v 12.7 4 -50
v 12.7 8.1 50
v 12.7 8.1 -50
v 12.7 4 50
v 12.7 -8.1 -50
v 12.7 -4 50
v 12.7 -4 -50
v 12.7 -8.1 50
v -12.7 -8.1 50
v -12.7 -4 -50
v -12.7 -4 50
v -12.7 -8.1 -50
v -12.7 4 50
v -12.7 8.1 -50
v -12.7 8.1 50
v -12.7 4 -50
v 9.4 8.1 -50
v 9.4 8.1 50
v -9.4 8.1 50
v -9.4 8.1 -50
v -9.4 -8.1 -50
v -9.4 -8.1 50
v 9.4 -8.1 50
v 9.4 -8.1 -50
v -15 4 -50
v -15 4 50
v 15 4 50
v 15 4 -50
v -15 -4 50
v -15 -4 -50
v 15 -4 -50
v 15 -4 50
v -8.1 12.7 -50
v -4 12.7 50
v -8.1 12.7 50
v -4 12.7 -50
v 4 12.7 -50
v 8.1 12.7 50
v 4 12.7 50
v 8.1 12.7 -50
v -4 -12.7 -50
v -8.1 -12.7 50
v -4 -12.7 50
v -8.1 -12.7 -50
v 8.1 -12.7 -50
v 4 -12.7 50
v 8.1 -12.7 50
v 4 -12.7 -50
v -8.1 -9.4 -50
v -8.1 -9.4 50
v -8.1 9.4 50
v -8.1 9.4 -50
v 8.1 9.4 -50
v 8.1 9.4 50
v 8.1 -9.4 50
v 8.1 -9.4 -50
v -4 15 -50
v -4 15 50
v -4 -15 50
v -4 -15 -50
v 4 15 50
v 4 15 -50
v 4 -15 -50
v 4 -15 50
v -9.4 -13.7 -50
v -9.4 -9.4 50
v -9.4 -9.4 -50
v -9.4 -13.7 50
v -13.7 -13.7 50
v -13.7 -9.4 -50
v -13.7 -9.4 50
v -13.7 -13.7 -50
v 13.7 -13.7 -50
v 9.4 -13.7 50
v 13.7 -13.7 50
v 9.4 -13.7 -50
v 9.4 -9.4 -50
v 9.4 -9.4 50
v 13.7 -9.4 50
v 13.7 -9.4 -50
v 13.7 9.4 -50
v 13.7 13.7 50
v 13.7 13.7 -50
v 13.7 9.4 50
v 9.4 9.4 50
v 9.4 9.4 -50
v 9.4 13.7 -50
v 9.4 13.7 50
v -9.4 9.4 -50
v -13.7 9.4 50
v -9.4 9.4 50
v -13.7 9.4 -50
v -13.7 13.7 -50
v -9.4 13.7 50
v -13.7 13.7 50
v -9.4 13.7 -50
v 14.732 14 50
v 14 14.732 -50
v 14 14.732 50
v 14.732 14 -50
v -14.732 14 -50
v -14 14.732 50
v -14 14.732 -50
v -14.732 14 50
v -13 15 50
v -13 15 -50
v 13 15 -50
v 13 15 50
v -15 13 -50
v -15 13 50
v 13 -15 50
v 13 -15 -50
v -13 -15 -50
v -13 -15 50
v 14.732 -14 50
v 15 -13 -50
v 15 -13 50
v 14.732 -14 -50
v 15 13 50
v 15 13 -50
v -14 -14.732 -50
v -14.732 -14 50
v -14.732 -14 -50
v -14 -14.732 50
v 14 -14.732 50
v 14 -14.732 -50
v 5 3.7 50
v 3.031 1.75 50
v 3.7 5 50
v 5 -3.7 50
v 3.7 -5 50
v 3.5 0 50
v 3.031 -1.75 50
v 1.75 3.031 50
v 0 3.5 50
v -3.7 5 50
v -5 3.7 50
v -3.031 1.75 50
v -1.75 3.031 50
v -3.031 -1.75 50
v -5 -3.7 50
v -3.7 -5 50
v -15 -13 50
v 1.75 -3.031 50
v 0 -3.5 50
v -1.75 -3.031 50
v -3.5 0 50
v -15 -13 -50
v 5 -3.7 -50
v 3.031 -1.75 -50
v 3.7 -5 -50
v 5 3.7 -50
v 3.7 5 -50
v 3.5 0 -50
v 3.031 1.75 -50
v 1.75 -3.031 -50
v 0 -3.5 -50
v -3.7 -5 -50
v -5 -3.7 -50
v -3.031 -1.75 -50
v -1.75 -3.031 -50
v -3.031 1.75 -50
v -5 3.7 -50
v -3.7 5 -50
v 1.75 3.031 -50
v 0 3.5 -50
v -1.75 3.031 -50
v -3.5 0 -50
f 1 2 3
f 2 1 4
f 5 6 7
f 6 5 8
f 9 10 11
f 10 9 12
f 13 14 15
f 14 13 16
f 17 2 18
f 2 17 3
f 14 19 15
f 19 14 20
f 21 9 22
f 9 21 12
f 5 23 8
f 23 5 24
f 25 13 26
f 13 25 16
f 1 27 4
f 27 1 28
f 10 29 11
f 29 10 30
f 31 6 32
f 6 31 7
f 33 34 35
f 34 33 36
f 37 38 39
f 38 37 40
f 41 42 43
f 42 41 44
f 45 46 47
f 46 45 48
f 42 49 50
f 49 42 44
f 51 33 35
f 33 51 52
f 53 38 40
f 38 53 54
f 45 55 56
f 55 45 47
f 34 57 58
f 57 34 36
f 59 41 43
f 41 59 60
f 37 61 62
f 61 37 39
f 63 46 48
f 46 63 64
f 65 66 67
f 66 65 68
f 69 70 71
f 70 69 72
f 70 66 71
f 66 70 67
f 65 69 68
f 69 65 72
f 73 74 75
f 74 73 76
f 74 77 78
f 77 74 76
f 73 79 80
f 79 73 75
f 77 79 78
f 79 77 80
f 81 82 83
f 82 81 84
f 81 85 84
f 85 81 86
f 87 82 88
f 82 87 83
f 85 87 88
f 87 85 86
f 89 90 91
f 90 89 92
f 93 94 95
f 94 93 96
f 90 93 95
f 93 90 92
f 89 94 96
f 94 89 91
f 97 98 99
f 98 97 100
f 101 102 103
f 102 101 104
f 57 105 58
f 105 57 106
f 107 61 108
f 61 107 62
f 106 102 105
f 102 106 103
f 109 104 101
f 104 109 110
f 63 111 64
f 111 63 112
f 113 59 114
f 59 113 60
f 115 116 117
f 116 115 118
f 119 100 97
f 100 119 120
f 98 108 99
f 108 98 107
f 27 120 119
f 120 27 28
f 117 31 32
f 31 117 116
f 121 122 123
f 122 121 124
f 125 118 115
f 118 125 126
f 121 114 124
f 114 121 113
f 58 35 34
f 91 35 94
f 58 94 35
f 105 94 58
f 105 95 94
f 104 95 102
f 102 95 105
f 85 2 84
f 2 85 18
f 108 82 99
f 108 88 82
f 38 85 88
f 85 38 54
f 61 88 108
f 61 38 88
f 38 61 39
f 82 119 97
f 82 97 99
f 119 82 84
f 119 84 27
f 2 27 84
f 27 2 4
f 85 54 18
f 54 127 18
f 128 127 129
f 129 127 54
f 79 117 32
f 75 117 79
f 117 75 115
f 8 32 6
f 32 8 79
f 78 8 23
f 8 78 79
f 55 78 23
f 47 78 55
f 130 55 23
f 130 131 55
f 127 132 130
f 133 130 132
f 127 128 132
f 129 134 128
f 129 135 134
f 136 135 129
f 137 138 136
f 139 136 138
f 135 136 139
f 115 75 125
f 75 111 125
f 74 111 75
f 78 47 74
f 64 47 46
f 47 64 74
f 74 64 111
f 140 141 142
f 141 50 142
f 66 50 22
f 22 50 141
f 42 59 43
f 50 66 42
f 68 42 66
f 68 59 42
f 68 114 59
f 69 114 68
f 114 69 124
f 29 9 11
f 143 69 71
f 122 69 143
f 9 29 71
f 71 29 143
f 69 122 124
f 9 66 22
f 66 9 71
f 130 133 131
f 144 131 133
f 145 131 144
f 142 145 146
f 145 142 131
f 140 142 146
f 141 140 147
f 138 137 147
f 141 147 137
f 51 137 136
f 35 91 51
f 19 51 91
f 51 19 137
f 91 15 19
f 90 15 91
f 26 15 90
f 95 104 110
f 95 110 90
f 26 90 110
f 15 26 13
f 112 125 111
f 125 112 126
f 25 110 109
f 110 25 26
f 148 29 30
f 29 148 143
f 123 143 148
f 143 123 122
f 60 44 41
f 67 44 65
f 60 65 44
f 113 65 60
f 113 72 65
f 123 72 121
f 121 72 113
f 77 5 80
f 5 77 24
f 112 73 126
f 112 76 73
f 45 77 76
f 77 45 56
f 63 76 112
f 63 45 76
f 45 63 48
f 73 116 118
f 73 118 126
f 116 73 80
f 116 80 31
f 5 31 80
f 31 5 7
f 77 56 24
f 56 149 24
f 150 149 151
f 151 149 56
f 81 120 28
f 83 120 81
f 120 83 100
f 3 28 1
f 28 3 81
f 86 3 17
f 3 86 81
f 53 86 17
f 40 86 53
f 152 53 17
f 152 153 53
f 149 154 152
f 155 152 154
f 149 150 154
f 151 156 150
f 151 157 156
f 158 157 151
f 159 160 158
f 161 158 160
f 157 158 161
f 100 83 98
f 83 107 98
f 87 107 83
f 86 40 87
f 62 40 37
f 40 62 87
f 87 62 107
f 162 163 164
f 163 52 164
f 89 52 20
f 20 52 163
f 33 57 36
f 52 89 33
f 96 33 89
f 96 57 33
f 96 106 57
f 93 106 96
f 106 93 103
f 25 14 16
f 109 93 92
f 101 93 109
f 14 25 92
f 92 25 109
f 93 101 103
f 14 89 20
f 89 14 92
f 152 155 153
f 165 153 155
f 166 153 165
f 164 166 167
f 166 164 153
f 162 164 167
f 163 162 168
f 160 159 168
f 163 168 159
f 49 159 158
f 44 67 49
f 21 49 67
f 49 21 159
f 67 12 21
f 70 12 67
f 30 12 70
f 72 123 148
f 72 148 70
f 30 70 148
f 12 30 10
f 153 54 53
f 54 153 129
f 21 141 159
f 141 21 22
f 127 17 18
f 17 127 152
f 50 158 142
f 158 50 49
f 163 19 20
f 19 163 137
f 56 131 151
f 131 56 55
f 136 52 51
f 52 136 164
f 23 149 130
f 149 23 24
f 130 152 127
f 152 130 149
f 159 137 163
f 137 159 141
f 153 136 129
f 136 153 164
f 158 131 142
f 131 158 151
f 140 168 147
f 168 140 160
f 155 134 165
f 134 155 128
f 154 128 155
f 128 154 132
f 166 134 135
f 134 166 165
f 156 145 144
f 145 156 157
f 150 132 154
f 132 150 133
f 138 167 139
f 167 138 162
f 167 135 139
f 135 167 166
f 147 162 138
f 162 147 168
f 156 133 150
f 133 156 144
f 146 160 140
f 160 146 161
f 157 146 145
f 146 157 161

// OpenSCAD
// eLKa1
// profile3030
// GNU GPL v3
// lkiefer <blog.lkiefer.org> and contributors
// http://www.reprap.org/wiki/ELKa
// https://github.com/kimented/elka1

//Profilé 3030

module profile3030(longueur, center){
  r=2;
  fn=12;
  e1=2.3;
  e2=1.3;
  q1=4.3;
 
  difference(){
    // forme extérieure de base
    hull(){
      for (i = [0 : 3]){
          rotate([0,0,i*90]) translate([-30/2+r, -30/2+r]) cylinder(h=longueur,r=r, center=true, $fn=fn);
      }
    }
    // délimitation des quatre carrés
    for (i = [0 : 1]){
        rotate([0,0,i*90]) cube([30-2*e1,30-4*e2-2*q1,longueur+2],center=true);
        rotate([0,0,i*90]) cube([32,8,longueur+2], center=true);
    }
    // trous des carrés
    for (i = [0 : 3]){
        rotate([0,0,i*90]) translate([-30/2+e2,-30/2+e2,-longueur/2-1]) cube([q1,q1,longueur+2]);
    }
  }
  
    
  
  
  difference(){
    union(){
      // ailettes intérieures 
      for (i= [0 : 1]){
        rotate([0,0,90*i]) hull(){
          for (j= [0 : 1]){
            rotate ([0,0,180*j]) translate([-30/2+e2+q1,-30/2+e2+q1,-longueur/2]) cube([e2,e2,longueur]);
          }
        }
      }
      
      // carré central
      cube([10,10,longueur], center=true);
    }
    cylinder(d=7,h=longueur+2,center=true, $fn=fn);
  }
  echo (str("profilé 3030 l=",longueur,"mm"));
}


profile3030(100);
